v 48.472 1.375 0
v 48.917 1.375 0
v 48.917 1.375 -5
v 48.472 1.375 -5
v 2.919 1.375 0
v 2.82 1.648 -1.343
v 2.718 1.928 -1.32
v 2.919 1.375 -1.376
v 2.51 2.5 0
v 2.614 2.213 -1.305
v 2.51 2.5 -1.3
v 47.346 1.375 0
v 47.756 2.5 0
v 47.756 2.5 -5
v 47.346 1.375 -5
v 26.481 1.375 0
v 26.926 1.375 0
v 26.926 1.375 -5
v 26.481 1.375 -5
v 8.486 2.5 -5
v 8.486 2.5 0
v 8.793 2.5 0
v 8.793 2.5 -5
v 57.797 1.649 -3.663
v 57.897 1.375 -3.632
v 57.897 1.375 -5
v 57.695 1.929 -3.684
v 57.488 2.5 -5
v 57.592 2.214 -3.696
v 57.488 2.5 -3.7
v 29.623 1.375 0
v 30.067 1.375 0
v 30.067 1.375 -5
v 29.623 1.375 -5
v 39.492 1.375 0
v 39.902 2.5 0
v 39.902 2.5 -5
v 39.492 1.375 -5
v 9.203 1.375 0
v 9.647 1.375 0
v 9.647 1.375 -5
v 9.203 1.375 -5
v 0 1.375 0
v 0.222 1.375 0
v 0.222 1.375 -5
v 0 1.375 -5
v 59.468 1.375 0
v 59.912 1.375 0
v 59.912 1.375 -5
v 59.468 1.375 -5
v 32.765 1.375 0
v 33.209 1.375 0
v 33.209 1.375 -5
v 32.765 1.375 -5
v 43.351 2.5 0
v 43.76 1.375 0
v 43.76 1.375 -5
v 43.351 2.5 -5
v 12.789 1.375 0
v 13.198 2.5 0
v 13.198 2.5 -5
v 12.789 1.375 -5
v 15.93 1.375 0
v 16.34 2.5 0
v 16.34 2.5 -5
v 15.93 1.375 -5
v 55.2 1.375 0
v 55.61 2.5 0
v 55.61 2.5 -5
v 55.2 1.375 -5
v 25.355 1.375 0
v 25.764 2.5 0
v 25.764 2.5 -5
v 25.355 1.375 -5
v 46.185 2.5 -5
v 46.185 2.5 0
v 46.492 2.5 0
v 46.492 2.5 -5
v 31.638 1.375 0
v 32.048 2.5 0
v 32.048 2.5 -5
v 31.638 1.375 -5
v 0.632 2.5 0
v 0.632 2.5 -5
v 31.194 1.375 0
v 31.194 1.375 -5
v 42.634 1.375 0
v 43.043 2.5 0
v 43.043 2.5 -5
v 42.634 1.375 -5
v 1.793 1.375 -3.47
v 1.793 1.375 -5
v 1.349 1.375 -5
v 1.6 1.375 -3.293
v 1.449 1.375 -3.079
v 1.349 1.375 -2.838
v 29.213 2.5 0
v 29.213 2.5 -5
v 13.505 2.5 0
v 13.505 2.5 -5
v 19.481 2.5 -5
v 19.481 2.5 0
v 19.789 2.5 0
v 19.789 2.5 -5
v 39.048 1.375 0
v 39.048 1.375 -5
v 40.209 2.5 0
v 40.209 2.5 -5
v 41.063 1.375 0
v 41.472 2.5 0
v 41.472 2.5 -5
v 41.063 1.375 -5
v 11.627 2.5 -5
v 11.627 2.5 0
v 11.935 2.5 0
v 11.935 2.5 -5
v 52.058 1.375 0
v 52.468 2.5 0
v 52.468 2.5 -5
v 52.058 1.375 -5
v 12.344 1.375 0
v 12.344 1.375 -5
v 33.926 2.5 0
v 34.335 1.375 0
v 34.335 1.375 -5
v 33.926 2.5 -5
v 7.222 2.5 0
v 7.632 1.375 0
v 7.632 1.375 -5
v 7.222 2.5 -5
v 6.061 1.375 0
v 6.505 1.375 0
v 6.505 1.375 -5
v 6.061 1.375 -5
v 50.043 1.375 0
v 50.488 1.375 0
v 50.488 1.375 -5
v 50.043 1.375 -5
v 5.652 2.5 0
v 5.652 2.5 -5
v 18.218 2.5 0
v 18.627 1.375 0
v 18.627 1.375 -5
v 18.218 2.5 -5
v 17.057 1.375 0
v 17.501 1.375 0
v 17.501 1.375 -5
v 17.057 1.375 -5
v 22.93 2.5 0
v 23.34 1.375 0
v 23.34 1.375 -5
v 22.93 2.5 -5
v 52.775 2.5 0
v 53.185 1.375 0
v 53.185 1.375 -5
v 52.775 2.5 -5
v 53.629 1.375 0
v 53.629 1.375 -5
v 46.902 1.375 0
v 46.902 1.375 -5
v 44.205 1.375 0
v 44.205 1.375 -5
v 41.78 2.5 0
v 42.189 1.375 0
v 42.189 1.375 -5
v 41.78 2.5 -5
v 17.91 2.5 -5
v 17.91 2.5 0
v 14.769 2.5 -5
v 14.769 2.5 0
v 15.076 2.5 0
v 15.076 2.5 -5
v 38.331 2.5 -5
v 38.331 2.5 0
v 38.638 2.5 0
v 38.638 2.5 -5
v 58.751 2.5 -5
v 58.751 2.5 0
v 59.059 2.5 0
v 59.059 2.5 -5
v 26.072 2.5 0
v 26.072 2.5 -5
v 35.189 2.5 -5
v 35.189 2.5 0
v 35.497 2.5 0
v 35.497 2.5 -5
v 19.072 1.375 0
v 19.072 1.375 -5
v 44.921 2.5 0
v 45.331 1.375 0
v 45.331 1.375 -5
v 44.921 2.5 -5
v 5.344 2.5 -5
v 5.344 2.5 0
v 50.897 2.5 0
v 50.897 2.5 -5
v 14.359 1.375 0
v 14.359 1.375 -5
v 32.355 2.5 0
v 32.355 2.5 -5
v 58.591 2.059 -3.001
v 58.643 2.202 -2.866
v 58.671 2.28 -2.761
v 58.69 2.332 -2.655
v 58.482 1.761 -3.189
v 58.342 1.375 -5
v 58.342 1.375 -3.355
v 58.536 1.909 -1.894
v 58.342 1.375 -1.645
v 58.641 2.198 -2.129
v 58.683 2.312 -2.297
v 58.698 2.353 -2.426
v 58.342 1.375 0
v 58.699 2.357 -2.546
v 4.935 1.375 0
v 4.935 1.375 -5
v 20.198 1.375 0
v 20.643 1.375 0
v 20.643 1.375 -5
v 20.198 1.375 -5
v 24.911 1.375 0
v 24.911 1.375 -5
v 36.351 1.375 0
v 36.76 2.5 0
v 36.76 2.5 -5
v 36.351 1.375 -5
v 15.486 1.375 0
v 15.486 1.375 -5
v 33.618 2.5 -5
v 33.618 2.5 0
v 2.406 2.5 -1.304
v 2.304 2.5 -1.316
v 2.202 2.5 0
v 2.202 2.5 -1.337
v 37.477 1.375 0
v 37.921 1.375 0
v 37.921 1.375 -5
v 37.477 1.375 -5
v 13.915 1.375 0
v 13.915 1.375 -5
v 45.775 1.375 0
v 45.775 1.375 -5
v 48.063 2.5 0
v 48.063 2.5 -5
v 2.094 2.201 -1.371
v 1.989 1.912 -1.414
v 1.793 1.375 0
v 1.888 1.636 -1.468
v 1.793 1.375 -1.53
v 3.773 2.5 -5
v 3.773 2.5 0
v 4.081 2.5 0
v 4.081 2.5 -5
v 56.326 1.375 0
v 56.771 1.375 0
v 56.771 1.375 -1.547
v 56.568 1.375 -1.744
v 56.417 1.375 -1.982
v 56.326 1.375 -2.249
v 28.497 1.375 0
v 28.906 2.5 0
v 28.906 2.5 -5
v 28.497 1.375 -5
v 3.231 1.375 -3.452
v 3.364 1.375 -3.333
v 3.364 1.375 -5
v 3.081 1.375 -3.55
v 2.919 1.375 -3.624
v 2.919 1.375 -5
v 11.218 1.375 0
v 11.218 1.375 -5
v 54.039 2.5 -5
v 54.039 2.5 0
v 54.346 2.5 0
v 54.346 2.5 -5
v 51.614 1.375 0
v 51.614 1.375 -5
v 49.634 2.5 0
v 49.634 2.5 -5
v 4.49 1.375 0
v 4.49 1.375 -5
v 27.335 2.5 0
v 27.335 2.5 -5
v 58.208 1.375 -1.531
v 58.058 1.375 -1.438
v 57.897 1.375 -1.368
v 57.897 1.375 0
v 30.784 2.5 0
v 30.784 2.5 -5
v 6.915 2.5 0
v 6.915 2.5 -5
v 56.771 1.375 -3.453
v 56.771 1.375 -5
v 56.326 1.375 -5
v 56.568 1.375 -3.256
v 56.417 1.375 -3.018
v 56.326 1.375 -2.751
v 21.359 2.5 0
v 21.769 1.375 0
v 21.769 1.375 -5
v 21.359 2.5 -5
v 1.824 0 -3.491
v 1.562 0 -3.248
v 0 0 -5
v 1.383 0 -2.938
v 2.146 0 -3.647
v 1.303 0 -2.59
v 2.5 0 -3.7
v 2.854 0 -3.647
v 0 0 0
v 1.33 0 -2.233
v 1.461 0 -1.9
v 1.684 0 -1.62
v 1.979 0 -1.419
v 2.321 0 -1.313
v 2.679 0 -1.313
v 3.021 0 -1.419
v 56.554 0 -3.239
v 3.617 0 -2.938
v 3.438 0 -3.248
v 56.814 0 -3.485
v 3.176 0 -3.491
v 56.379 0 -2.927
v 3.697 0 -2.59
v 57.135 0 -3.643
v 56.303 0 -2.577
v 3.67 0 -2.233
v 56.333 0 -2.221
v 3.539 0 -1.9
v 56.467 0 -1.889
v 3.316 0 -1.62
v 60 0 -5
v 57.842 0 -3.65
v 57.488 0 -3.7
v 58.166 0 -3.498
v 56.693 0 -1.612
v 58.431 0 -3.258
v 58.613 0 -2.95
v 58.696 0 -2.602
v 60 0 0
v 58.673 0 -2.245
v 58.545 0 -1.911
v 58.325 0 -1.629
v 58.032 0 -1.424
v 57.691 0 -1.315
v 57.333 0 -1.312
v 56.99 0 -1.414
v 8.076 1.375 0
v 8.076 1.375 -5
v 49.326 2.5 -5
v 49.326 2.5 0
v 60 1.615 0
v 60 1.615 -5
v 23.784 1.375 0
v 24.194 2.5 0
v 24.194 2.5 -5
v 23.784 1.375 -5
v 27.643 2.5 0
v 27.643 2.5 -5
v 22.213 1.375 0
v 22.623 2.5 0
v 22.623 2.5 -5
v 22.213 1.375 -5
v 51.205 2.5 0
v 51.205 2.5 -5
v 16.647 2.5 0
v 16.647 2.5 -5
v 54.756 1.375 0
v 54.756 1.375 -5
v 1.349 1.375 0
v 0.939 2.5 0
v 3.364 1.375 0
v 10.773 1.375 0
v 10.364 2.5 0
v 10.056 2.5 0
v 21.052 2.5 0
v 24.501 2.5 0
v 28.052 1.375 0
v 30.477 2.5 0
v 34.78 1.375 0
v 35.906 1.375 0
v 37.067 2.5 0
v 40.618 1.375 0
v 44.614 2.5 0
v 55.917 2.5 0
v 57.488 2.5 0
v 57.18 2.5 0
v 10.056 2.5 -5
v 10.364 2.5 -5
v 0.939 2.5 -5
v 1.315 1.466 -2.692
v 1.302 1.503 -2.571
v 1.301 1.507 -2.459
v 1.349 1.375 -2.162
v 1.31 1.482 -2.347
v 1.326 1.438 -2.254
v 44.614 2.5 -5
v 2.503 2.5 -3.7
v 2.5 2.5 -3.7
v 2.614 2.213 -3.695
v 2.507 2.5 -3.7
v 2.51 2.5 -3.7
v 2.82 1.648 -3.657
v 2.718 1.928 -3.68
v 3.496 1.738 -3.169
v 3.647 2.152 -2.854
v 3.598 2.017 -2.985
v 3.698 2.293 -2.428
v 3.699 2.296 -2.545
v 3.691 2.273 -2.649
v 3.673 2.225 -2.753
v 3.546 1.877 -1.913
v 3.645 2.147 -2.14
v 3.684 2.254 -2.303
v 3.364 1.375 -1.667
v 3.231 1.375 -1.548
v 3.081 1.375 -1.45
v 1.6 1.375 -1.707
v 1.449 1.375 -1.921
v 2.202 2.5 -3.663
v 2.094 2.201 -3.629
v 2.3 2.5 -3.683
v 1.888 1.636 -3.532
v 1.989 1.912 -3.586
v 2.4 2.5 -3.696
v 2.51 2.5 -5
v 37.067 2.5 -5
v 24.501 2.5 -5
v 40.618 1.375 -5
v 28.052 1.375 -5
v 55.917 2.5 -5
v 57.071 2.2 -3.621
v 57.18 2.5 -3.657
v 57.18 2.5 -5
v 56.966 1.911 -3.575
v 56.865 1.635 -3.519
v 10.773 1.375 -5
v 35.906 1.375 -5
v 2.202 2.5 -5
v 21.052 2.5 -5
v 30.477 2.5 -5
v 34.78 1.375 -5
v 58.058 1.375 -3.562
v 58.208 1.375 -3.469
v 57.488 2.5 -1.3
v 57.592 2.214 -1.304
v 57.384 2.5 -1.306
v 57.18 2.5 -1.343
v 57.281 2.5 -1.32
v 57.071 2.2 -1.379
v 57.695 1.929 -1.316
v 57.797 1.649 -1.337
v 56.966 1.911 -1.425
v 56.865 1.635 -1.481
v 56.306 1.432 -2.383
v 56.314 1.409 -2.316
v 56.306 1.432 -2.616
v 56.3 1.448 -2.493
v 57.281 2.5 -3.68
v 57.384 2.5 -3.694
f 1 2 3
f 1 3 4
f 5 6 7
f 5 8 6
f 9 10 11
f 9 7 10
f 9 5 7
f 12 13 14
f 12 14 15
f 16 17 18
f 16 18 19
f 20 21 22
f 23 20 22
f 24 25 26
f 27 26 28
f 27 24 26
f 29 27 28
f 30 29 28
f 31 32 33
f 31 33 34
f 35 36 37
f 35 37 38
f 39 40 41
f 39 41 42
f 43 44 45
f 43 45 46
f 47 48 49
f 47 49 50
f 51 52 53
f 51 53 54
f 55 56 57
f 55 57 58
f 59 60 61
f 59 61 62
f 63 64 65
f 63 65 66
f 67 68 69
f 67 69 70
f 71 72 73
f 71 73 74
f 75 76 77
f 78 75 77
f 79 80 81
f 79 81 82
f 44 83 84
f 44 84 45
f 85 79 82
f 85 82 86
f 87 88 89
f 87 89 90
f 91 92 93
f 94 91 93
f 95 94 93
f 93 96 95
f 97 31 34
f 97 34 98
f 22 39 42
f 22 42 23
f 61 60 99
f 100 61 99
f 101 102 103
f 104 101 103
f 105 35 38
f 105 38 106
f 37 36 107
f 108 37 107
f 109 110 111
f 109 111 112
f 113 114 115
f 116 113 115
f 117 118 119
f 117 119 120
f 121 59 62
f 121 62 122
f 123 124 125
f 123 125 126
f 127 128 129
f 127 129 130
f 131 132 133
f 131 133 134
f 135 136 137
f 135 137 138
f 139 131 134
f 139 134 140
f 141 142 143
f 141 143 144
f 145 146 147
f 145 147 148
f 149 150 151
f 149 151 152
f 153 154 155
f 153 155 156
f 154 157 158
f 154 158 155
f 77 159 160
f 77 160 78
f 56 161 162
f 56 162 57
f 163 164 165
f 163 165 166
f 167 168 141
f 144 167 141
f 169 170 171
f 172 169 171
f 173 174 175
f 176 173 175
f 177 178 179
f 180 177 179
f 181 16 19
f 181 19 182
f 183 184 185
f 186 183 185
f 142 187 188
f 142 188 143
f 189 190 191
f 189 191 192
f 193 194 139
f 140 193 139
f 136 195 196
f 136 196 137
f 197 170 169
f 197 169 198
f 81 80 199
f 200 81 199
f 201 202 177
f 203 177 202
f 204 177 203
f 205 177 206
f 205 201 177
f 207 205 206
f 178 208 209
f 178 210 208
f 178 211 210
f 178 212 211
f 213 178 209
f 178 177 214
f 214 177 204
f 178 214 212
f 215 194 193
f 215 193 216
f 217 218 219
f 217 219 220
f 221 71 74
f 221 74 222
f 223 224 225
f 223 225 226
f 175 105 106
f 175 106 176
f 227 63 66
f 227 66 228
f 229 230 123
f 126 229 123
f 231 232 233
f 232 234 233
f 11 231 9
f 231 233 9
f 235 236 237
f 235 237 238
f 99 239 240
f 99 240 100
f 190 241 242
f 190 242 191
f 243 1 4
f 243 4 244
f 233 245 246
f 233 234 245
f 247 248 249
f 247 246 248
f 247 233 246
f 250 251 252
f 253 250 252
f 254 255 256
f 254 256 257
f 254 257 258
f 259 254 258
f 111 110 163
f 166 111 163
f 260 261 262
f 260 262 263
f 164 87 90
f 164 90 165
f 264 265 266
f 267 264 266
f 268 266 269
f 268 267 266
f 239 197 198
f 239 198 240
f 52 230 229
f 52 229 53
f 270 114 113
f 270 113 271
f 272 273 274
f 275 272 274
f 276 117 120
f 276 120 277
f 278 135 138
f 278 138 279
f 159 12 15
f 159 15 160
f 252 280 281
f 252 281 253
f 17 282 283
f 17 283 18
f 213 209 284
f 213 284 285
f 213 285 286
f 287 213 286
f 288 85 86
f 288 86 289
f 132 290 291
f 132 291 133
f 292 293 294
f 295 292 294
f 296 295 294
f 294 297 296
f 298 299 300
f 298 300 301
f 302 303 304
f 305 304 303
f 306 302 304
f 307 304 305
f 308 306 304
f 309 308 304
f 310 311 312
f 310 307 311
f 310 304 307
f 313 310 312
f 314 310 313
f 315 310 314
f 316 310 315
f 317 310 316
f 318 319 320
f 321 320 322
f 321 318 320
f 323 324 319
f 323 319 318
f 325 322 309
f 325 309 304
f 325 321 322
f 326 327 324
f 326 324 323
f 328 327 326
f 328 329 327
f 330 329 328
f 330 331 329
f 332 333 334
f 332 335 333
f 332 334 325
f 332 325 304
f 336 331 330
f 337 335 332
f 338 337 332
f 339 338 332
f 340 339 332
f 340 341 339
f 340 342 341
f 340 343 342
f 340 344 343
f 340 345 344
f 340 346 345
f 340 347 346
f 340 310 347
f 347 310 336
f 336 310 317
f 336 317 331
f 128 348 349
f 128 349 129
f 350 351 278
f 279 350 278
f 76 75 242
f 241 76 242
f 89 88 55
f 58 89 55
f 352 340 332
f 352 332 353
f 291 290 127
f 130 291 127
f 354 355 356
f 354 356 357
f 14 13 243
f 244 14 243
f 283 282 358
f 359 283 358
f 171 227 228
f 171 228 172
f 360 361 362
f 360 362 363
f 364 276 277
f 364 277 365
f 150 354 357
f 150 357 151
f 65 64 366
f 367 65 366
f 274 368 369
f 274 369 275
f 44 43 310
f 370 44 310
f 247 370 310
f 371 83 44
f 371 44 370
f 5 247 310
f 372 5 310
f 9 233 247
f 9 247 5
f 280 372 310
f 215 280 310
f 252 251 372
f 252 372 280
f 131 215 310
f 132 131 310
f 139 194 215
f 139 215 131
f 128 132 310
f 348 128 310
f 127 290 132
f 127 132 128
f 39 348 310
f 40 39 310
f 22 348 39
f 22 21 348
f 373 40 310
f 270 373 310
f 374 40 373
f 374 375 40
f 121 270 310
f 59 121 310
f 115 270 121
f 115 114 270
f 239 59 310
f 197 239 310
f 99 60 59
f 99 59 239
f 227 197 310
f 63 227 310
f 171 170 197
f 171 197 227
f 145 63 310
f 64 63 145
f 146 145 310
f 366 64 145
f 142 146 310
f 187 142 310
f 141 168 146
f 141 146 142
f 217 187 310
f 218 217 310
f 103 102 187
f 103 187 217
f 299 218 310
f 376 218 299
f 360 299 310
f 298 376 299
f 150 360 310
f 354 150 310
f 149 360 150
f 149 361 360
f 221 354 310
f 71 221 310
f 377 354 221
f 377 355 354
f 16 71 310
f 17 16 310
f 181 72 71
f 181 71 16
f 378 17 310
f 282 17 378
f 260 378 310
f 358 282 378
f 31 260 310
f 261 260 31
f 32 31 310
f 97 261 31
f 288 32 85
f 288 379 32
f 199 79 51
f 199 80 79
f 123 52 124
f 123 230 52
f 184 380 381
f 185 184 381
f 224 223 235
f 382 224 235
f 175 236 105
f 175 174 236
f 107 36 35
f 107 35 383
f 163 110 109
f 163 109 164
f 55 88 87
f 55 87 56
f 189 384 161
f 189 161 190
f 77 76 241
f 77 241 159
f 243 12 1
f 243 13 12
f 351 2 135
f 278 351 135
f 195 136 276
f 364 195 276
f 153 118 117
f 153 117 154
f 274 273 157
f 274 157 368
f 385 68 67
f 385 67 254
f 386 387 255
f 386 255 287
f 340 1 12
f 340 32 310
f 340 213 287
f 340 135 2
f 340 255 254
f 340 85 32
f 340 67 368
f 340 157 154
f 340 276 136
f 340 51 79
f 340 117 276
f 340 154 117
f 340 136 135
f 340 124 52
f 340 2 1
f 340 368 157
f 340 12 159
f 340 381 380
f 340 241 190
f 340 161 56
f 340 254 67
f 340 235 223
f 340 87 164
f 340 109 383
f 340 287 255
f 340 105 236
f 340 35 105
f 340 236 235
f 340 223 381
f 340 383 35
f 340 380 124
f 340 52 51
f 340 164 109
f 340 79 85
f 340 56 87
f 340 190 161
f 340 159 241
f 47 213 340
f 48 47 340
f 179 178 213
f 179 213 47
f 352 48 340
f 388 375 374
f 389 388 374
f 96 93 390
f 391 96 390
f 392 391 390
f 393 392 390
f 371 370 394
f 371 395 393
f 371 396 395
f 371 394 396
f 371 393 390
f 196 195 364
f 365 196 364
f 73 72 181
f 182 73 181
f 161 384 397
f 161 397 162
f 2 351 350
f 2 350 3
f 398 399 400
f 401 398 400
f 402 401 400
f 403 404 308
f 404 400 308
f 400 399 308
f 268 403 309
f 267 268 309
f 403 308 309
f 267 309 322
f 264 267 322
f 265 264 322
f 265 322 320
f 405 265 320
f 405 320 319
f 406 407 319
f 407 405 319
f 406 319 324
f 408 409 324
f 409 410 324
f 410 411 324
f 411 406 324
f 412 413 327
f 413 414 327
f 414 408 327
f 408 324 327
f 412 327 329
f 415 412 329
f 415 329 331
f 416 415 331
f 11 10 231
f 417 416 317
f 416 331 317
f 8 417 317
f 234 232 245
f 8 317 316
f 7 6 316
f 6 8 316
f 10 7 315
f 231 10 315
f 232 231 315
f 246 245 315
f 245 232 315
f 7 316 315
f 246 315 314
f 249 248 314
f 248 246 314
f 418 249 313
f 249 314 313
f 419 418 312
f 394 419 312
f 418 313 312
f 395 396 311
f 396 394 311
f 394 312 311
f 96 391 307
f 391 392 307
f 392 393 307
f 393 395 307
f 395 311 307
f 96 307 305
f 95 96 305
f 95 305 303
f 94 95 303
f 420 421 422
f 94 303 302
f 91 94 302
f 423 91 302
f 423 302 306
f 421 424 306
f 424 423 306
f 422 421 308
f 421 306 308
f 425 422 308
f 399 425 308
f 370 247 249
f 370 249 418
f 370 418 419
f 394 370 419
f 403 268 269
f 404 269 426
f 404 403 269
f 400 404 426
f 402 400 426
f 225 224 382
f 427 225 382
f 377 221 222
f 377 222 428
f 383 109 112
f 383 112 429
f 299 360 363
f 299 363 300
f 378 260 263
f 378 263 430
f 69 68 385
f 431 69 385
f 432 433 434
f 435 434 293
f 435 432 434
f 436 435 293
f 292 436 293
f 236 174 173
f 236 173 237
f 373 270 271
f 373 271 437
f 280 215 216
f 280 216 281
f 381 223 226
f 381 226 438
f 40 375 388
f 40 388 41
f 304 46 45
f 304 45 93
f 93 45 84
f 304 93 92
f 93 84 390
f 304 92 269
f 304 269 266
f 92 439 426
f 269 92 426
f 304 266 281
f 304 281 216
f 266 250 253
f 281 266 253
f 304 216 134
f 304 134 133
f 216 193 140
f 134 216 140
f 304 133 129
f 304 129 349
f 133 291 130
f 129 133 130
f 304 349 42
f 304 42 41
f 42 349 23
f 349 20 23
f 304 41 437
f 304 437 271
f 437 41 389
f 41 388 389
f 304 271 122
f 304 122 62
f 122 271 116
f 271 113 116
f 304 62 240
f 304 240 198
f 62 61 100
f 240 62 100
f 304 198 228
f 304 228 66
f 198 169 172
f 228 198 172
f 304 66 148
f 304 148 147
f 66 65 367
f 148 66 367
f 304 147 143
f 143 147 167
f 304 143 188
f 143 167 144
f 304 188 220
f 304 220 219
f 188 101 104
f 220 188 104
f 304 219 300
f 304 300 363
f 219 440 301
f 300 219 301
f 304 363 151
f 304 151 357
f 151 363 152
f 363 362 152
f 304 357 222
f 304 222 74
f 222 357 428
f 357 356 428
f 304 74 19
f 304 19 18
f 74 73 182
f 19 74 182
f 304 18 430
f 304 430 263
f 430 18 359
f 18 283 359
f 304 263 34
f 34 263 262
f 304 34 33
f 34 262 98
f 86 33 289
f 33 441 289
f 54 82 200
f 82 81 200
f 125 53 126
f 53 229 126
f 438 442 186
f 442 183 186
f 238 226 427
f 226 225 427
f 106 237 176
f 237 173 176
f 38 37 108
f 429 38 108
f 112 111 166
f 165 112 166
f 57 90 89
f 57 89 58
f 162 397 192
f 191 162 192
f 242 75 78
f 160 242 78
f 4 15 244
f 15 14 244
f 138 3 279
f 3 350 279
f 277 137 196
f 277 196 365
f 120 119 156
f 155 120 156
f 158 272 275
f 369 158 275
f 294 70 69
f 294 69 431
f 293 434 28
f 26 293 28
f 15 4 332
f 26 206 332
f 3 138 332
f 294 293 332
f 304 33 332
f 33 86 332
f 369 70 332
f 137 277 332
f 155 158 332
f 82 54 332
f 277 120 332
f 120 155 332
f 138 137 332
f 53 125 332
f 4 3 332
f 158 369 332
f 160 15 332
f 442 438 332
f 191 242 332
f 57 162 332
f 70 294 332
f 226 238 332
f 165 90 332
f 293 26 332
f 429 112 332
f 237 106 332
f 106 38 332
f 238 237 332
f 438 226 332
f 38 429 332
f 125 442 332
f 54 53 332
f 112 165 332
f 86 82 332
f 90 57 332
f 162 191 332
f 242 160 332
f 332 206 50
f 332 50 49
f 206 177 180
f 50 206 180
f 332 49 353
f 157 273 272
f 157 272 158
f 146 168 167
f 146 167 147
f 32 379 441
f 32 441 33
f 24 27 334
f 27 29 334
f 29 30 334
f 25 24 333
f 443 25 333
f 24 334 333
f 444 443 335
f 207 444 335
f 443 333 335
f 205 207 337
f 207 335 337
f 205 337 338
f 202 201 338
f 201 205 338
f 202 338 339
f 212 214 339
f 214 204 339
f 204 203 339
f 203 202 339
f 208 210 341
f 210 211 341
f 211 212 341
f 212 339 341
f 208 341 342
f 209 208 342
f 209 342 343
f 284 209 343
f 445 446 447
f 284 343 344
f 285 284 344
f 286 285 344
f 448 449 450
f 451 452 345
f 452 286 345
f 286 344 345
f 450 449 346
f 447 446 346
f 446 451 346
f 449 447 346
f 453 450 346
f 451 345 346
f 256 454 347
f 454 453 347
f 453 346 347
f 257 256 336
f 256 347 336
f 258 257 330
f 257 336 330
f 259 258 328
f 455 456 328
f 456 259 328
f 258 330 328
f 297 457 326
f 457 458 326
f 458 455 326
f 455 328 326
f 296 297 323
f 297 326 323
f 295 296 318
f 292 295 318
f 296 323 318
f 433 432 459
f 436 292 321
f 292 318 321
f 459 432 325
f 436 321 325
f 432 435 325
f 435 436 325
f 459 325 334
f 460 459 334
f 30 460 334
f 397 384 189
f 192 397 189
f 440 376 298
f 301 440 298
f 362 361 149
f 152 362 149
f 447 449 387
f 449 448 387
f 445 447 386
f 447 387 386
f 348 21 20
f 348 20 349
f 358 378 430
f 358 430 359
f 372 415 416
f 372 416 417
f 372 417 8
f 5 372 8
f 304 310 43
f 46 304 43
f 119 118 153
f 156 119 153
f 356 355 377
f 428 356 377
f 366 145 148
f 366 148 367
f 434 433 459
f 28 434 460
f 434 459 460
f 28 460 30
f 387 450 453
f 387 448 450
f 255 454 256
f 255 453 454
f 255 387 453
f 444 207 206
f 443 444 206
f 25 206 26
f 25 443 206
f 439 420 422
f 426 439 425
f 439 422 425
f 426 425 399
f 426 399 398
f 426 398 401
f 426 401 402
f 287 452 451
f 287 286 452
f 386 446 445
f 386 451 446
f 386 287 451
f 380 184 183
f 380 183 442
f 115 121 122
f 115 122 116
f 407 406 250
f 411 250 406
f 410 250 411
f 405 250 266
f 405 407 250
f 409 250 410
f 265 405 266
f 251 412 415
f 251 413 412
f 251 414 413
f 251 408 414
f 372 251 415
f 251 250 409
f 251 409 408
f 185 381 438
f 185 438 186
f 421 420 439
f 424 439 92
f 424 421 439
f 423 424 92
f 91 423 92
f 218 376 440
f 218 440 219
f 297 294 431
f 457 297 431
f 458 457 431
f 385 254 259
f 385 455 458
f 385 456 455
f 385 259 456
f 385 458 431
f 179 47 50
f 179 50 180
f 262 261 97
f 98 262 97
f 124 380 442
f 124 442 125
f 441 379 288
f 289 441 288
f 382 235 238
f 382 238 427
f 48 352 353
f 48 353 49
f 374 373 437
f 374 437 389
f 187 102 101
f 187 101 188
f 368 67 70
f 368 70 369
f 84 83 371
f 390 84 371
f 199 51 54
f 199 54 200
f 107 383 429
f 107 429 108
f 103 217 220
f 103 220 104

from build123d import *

# Parameters (mm, degrees)
BLANKSKE_W         = 60
BLANKSKE_H         = 2.5
BLANK_DEPTH        = 5
TOOTHCUTSIM_DEPTH  = 61.259853966
TEETHCUTS_COUNT    = 39
TEETHCUTS_PITCH    = 1.570796325
SKETCH1_R          = 1.2
CUT_EXTRUDE1_DEPTH = 10


with BuildPart() as part:
    # BlankSke → Blank (new body)
    with BuildSketch(Plane.XY):
        with Locations((30, 1.25)):
            Rectangle(BLANKSKE_W, BLANKSKE_H)
    extrude(amount=-BLANK_DEPTH)

    # TooCutSkeSim → ToothCutSim (cut, through all)
    with BuildSketch(Plane.XY):
        Polygon((0.222217685, 1.375), (-0.222217685, 1.375), (-0.640929042, 2.5254), (0.640929042, 2.5254), align=None)
    toothcutsim = extrude(amount=-TOOTHCUTSIM_DEPTH, mode=Mode.SUBTRACT)

    # TeethCuts: ToothCutSim ×39
    with Locations(*[(i * TEETHCUTS_PITCH, 0, 0) for i in range(1, TEETHCUTS_COUNT)]):
        add(toothcutsim, mode=Mode.SUBTRACT)

    # Sketch1 → Cut-Extrude1 (cut)
    with BuildSketch(Plane.XZ):
        with Locations(Location((2.5, -2.5, 0), (0, 0, 270))):
            Circle(SKETCH1_R)
        with Locations(Location((57.5, -2.5, 0), (0, 0, 269.416519615))):
            Circle(SKETCH1_R)
    extrude(amount=-CUT_EXTRUDE1_DEPTH, mode=Mode.SUBTRACT)


solid = part.part
